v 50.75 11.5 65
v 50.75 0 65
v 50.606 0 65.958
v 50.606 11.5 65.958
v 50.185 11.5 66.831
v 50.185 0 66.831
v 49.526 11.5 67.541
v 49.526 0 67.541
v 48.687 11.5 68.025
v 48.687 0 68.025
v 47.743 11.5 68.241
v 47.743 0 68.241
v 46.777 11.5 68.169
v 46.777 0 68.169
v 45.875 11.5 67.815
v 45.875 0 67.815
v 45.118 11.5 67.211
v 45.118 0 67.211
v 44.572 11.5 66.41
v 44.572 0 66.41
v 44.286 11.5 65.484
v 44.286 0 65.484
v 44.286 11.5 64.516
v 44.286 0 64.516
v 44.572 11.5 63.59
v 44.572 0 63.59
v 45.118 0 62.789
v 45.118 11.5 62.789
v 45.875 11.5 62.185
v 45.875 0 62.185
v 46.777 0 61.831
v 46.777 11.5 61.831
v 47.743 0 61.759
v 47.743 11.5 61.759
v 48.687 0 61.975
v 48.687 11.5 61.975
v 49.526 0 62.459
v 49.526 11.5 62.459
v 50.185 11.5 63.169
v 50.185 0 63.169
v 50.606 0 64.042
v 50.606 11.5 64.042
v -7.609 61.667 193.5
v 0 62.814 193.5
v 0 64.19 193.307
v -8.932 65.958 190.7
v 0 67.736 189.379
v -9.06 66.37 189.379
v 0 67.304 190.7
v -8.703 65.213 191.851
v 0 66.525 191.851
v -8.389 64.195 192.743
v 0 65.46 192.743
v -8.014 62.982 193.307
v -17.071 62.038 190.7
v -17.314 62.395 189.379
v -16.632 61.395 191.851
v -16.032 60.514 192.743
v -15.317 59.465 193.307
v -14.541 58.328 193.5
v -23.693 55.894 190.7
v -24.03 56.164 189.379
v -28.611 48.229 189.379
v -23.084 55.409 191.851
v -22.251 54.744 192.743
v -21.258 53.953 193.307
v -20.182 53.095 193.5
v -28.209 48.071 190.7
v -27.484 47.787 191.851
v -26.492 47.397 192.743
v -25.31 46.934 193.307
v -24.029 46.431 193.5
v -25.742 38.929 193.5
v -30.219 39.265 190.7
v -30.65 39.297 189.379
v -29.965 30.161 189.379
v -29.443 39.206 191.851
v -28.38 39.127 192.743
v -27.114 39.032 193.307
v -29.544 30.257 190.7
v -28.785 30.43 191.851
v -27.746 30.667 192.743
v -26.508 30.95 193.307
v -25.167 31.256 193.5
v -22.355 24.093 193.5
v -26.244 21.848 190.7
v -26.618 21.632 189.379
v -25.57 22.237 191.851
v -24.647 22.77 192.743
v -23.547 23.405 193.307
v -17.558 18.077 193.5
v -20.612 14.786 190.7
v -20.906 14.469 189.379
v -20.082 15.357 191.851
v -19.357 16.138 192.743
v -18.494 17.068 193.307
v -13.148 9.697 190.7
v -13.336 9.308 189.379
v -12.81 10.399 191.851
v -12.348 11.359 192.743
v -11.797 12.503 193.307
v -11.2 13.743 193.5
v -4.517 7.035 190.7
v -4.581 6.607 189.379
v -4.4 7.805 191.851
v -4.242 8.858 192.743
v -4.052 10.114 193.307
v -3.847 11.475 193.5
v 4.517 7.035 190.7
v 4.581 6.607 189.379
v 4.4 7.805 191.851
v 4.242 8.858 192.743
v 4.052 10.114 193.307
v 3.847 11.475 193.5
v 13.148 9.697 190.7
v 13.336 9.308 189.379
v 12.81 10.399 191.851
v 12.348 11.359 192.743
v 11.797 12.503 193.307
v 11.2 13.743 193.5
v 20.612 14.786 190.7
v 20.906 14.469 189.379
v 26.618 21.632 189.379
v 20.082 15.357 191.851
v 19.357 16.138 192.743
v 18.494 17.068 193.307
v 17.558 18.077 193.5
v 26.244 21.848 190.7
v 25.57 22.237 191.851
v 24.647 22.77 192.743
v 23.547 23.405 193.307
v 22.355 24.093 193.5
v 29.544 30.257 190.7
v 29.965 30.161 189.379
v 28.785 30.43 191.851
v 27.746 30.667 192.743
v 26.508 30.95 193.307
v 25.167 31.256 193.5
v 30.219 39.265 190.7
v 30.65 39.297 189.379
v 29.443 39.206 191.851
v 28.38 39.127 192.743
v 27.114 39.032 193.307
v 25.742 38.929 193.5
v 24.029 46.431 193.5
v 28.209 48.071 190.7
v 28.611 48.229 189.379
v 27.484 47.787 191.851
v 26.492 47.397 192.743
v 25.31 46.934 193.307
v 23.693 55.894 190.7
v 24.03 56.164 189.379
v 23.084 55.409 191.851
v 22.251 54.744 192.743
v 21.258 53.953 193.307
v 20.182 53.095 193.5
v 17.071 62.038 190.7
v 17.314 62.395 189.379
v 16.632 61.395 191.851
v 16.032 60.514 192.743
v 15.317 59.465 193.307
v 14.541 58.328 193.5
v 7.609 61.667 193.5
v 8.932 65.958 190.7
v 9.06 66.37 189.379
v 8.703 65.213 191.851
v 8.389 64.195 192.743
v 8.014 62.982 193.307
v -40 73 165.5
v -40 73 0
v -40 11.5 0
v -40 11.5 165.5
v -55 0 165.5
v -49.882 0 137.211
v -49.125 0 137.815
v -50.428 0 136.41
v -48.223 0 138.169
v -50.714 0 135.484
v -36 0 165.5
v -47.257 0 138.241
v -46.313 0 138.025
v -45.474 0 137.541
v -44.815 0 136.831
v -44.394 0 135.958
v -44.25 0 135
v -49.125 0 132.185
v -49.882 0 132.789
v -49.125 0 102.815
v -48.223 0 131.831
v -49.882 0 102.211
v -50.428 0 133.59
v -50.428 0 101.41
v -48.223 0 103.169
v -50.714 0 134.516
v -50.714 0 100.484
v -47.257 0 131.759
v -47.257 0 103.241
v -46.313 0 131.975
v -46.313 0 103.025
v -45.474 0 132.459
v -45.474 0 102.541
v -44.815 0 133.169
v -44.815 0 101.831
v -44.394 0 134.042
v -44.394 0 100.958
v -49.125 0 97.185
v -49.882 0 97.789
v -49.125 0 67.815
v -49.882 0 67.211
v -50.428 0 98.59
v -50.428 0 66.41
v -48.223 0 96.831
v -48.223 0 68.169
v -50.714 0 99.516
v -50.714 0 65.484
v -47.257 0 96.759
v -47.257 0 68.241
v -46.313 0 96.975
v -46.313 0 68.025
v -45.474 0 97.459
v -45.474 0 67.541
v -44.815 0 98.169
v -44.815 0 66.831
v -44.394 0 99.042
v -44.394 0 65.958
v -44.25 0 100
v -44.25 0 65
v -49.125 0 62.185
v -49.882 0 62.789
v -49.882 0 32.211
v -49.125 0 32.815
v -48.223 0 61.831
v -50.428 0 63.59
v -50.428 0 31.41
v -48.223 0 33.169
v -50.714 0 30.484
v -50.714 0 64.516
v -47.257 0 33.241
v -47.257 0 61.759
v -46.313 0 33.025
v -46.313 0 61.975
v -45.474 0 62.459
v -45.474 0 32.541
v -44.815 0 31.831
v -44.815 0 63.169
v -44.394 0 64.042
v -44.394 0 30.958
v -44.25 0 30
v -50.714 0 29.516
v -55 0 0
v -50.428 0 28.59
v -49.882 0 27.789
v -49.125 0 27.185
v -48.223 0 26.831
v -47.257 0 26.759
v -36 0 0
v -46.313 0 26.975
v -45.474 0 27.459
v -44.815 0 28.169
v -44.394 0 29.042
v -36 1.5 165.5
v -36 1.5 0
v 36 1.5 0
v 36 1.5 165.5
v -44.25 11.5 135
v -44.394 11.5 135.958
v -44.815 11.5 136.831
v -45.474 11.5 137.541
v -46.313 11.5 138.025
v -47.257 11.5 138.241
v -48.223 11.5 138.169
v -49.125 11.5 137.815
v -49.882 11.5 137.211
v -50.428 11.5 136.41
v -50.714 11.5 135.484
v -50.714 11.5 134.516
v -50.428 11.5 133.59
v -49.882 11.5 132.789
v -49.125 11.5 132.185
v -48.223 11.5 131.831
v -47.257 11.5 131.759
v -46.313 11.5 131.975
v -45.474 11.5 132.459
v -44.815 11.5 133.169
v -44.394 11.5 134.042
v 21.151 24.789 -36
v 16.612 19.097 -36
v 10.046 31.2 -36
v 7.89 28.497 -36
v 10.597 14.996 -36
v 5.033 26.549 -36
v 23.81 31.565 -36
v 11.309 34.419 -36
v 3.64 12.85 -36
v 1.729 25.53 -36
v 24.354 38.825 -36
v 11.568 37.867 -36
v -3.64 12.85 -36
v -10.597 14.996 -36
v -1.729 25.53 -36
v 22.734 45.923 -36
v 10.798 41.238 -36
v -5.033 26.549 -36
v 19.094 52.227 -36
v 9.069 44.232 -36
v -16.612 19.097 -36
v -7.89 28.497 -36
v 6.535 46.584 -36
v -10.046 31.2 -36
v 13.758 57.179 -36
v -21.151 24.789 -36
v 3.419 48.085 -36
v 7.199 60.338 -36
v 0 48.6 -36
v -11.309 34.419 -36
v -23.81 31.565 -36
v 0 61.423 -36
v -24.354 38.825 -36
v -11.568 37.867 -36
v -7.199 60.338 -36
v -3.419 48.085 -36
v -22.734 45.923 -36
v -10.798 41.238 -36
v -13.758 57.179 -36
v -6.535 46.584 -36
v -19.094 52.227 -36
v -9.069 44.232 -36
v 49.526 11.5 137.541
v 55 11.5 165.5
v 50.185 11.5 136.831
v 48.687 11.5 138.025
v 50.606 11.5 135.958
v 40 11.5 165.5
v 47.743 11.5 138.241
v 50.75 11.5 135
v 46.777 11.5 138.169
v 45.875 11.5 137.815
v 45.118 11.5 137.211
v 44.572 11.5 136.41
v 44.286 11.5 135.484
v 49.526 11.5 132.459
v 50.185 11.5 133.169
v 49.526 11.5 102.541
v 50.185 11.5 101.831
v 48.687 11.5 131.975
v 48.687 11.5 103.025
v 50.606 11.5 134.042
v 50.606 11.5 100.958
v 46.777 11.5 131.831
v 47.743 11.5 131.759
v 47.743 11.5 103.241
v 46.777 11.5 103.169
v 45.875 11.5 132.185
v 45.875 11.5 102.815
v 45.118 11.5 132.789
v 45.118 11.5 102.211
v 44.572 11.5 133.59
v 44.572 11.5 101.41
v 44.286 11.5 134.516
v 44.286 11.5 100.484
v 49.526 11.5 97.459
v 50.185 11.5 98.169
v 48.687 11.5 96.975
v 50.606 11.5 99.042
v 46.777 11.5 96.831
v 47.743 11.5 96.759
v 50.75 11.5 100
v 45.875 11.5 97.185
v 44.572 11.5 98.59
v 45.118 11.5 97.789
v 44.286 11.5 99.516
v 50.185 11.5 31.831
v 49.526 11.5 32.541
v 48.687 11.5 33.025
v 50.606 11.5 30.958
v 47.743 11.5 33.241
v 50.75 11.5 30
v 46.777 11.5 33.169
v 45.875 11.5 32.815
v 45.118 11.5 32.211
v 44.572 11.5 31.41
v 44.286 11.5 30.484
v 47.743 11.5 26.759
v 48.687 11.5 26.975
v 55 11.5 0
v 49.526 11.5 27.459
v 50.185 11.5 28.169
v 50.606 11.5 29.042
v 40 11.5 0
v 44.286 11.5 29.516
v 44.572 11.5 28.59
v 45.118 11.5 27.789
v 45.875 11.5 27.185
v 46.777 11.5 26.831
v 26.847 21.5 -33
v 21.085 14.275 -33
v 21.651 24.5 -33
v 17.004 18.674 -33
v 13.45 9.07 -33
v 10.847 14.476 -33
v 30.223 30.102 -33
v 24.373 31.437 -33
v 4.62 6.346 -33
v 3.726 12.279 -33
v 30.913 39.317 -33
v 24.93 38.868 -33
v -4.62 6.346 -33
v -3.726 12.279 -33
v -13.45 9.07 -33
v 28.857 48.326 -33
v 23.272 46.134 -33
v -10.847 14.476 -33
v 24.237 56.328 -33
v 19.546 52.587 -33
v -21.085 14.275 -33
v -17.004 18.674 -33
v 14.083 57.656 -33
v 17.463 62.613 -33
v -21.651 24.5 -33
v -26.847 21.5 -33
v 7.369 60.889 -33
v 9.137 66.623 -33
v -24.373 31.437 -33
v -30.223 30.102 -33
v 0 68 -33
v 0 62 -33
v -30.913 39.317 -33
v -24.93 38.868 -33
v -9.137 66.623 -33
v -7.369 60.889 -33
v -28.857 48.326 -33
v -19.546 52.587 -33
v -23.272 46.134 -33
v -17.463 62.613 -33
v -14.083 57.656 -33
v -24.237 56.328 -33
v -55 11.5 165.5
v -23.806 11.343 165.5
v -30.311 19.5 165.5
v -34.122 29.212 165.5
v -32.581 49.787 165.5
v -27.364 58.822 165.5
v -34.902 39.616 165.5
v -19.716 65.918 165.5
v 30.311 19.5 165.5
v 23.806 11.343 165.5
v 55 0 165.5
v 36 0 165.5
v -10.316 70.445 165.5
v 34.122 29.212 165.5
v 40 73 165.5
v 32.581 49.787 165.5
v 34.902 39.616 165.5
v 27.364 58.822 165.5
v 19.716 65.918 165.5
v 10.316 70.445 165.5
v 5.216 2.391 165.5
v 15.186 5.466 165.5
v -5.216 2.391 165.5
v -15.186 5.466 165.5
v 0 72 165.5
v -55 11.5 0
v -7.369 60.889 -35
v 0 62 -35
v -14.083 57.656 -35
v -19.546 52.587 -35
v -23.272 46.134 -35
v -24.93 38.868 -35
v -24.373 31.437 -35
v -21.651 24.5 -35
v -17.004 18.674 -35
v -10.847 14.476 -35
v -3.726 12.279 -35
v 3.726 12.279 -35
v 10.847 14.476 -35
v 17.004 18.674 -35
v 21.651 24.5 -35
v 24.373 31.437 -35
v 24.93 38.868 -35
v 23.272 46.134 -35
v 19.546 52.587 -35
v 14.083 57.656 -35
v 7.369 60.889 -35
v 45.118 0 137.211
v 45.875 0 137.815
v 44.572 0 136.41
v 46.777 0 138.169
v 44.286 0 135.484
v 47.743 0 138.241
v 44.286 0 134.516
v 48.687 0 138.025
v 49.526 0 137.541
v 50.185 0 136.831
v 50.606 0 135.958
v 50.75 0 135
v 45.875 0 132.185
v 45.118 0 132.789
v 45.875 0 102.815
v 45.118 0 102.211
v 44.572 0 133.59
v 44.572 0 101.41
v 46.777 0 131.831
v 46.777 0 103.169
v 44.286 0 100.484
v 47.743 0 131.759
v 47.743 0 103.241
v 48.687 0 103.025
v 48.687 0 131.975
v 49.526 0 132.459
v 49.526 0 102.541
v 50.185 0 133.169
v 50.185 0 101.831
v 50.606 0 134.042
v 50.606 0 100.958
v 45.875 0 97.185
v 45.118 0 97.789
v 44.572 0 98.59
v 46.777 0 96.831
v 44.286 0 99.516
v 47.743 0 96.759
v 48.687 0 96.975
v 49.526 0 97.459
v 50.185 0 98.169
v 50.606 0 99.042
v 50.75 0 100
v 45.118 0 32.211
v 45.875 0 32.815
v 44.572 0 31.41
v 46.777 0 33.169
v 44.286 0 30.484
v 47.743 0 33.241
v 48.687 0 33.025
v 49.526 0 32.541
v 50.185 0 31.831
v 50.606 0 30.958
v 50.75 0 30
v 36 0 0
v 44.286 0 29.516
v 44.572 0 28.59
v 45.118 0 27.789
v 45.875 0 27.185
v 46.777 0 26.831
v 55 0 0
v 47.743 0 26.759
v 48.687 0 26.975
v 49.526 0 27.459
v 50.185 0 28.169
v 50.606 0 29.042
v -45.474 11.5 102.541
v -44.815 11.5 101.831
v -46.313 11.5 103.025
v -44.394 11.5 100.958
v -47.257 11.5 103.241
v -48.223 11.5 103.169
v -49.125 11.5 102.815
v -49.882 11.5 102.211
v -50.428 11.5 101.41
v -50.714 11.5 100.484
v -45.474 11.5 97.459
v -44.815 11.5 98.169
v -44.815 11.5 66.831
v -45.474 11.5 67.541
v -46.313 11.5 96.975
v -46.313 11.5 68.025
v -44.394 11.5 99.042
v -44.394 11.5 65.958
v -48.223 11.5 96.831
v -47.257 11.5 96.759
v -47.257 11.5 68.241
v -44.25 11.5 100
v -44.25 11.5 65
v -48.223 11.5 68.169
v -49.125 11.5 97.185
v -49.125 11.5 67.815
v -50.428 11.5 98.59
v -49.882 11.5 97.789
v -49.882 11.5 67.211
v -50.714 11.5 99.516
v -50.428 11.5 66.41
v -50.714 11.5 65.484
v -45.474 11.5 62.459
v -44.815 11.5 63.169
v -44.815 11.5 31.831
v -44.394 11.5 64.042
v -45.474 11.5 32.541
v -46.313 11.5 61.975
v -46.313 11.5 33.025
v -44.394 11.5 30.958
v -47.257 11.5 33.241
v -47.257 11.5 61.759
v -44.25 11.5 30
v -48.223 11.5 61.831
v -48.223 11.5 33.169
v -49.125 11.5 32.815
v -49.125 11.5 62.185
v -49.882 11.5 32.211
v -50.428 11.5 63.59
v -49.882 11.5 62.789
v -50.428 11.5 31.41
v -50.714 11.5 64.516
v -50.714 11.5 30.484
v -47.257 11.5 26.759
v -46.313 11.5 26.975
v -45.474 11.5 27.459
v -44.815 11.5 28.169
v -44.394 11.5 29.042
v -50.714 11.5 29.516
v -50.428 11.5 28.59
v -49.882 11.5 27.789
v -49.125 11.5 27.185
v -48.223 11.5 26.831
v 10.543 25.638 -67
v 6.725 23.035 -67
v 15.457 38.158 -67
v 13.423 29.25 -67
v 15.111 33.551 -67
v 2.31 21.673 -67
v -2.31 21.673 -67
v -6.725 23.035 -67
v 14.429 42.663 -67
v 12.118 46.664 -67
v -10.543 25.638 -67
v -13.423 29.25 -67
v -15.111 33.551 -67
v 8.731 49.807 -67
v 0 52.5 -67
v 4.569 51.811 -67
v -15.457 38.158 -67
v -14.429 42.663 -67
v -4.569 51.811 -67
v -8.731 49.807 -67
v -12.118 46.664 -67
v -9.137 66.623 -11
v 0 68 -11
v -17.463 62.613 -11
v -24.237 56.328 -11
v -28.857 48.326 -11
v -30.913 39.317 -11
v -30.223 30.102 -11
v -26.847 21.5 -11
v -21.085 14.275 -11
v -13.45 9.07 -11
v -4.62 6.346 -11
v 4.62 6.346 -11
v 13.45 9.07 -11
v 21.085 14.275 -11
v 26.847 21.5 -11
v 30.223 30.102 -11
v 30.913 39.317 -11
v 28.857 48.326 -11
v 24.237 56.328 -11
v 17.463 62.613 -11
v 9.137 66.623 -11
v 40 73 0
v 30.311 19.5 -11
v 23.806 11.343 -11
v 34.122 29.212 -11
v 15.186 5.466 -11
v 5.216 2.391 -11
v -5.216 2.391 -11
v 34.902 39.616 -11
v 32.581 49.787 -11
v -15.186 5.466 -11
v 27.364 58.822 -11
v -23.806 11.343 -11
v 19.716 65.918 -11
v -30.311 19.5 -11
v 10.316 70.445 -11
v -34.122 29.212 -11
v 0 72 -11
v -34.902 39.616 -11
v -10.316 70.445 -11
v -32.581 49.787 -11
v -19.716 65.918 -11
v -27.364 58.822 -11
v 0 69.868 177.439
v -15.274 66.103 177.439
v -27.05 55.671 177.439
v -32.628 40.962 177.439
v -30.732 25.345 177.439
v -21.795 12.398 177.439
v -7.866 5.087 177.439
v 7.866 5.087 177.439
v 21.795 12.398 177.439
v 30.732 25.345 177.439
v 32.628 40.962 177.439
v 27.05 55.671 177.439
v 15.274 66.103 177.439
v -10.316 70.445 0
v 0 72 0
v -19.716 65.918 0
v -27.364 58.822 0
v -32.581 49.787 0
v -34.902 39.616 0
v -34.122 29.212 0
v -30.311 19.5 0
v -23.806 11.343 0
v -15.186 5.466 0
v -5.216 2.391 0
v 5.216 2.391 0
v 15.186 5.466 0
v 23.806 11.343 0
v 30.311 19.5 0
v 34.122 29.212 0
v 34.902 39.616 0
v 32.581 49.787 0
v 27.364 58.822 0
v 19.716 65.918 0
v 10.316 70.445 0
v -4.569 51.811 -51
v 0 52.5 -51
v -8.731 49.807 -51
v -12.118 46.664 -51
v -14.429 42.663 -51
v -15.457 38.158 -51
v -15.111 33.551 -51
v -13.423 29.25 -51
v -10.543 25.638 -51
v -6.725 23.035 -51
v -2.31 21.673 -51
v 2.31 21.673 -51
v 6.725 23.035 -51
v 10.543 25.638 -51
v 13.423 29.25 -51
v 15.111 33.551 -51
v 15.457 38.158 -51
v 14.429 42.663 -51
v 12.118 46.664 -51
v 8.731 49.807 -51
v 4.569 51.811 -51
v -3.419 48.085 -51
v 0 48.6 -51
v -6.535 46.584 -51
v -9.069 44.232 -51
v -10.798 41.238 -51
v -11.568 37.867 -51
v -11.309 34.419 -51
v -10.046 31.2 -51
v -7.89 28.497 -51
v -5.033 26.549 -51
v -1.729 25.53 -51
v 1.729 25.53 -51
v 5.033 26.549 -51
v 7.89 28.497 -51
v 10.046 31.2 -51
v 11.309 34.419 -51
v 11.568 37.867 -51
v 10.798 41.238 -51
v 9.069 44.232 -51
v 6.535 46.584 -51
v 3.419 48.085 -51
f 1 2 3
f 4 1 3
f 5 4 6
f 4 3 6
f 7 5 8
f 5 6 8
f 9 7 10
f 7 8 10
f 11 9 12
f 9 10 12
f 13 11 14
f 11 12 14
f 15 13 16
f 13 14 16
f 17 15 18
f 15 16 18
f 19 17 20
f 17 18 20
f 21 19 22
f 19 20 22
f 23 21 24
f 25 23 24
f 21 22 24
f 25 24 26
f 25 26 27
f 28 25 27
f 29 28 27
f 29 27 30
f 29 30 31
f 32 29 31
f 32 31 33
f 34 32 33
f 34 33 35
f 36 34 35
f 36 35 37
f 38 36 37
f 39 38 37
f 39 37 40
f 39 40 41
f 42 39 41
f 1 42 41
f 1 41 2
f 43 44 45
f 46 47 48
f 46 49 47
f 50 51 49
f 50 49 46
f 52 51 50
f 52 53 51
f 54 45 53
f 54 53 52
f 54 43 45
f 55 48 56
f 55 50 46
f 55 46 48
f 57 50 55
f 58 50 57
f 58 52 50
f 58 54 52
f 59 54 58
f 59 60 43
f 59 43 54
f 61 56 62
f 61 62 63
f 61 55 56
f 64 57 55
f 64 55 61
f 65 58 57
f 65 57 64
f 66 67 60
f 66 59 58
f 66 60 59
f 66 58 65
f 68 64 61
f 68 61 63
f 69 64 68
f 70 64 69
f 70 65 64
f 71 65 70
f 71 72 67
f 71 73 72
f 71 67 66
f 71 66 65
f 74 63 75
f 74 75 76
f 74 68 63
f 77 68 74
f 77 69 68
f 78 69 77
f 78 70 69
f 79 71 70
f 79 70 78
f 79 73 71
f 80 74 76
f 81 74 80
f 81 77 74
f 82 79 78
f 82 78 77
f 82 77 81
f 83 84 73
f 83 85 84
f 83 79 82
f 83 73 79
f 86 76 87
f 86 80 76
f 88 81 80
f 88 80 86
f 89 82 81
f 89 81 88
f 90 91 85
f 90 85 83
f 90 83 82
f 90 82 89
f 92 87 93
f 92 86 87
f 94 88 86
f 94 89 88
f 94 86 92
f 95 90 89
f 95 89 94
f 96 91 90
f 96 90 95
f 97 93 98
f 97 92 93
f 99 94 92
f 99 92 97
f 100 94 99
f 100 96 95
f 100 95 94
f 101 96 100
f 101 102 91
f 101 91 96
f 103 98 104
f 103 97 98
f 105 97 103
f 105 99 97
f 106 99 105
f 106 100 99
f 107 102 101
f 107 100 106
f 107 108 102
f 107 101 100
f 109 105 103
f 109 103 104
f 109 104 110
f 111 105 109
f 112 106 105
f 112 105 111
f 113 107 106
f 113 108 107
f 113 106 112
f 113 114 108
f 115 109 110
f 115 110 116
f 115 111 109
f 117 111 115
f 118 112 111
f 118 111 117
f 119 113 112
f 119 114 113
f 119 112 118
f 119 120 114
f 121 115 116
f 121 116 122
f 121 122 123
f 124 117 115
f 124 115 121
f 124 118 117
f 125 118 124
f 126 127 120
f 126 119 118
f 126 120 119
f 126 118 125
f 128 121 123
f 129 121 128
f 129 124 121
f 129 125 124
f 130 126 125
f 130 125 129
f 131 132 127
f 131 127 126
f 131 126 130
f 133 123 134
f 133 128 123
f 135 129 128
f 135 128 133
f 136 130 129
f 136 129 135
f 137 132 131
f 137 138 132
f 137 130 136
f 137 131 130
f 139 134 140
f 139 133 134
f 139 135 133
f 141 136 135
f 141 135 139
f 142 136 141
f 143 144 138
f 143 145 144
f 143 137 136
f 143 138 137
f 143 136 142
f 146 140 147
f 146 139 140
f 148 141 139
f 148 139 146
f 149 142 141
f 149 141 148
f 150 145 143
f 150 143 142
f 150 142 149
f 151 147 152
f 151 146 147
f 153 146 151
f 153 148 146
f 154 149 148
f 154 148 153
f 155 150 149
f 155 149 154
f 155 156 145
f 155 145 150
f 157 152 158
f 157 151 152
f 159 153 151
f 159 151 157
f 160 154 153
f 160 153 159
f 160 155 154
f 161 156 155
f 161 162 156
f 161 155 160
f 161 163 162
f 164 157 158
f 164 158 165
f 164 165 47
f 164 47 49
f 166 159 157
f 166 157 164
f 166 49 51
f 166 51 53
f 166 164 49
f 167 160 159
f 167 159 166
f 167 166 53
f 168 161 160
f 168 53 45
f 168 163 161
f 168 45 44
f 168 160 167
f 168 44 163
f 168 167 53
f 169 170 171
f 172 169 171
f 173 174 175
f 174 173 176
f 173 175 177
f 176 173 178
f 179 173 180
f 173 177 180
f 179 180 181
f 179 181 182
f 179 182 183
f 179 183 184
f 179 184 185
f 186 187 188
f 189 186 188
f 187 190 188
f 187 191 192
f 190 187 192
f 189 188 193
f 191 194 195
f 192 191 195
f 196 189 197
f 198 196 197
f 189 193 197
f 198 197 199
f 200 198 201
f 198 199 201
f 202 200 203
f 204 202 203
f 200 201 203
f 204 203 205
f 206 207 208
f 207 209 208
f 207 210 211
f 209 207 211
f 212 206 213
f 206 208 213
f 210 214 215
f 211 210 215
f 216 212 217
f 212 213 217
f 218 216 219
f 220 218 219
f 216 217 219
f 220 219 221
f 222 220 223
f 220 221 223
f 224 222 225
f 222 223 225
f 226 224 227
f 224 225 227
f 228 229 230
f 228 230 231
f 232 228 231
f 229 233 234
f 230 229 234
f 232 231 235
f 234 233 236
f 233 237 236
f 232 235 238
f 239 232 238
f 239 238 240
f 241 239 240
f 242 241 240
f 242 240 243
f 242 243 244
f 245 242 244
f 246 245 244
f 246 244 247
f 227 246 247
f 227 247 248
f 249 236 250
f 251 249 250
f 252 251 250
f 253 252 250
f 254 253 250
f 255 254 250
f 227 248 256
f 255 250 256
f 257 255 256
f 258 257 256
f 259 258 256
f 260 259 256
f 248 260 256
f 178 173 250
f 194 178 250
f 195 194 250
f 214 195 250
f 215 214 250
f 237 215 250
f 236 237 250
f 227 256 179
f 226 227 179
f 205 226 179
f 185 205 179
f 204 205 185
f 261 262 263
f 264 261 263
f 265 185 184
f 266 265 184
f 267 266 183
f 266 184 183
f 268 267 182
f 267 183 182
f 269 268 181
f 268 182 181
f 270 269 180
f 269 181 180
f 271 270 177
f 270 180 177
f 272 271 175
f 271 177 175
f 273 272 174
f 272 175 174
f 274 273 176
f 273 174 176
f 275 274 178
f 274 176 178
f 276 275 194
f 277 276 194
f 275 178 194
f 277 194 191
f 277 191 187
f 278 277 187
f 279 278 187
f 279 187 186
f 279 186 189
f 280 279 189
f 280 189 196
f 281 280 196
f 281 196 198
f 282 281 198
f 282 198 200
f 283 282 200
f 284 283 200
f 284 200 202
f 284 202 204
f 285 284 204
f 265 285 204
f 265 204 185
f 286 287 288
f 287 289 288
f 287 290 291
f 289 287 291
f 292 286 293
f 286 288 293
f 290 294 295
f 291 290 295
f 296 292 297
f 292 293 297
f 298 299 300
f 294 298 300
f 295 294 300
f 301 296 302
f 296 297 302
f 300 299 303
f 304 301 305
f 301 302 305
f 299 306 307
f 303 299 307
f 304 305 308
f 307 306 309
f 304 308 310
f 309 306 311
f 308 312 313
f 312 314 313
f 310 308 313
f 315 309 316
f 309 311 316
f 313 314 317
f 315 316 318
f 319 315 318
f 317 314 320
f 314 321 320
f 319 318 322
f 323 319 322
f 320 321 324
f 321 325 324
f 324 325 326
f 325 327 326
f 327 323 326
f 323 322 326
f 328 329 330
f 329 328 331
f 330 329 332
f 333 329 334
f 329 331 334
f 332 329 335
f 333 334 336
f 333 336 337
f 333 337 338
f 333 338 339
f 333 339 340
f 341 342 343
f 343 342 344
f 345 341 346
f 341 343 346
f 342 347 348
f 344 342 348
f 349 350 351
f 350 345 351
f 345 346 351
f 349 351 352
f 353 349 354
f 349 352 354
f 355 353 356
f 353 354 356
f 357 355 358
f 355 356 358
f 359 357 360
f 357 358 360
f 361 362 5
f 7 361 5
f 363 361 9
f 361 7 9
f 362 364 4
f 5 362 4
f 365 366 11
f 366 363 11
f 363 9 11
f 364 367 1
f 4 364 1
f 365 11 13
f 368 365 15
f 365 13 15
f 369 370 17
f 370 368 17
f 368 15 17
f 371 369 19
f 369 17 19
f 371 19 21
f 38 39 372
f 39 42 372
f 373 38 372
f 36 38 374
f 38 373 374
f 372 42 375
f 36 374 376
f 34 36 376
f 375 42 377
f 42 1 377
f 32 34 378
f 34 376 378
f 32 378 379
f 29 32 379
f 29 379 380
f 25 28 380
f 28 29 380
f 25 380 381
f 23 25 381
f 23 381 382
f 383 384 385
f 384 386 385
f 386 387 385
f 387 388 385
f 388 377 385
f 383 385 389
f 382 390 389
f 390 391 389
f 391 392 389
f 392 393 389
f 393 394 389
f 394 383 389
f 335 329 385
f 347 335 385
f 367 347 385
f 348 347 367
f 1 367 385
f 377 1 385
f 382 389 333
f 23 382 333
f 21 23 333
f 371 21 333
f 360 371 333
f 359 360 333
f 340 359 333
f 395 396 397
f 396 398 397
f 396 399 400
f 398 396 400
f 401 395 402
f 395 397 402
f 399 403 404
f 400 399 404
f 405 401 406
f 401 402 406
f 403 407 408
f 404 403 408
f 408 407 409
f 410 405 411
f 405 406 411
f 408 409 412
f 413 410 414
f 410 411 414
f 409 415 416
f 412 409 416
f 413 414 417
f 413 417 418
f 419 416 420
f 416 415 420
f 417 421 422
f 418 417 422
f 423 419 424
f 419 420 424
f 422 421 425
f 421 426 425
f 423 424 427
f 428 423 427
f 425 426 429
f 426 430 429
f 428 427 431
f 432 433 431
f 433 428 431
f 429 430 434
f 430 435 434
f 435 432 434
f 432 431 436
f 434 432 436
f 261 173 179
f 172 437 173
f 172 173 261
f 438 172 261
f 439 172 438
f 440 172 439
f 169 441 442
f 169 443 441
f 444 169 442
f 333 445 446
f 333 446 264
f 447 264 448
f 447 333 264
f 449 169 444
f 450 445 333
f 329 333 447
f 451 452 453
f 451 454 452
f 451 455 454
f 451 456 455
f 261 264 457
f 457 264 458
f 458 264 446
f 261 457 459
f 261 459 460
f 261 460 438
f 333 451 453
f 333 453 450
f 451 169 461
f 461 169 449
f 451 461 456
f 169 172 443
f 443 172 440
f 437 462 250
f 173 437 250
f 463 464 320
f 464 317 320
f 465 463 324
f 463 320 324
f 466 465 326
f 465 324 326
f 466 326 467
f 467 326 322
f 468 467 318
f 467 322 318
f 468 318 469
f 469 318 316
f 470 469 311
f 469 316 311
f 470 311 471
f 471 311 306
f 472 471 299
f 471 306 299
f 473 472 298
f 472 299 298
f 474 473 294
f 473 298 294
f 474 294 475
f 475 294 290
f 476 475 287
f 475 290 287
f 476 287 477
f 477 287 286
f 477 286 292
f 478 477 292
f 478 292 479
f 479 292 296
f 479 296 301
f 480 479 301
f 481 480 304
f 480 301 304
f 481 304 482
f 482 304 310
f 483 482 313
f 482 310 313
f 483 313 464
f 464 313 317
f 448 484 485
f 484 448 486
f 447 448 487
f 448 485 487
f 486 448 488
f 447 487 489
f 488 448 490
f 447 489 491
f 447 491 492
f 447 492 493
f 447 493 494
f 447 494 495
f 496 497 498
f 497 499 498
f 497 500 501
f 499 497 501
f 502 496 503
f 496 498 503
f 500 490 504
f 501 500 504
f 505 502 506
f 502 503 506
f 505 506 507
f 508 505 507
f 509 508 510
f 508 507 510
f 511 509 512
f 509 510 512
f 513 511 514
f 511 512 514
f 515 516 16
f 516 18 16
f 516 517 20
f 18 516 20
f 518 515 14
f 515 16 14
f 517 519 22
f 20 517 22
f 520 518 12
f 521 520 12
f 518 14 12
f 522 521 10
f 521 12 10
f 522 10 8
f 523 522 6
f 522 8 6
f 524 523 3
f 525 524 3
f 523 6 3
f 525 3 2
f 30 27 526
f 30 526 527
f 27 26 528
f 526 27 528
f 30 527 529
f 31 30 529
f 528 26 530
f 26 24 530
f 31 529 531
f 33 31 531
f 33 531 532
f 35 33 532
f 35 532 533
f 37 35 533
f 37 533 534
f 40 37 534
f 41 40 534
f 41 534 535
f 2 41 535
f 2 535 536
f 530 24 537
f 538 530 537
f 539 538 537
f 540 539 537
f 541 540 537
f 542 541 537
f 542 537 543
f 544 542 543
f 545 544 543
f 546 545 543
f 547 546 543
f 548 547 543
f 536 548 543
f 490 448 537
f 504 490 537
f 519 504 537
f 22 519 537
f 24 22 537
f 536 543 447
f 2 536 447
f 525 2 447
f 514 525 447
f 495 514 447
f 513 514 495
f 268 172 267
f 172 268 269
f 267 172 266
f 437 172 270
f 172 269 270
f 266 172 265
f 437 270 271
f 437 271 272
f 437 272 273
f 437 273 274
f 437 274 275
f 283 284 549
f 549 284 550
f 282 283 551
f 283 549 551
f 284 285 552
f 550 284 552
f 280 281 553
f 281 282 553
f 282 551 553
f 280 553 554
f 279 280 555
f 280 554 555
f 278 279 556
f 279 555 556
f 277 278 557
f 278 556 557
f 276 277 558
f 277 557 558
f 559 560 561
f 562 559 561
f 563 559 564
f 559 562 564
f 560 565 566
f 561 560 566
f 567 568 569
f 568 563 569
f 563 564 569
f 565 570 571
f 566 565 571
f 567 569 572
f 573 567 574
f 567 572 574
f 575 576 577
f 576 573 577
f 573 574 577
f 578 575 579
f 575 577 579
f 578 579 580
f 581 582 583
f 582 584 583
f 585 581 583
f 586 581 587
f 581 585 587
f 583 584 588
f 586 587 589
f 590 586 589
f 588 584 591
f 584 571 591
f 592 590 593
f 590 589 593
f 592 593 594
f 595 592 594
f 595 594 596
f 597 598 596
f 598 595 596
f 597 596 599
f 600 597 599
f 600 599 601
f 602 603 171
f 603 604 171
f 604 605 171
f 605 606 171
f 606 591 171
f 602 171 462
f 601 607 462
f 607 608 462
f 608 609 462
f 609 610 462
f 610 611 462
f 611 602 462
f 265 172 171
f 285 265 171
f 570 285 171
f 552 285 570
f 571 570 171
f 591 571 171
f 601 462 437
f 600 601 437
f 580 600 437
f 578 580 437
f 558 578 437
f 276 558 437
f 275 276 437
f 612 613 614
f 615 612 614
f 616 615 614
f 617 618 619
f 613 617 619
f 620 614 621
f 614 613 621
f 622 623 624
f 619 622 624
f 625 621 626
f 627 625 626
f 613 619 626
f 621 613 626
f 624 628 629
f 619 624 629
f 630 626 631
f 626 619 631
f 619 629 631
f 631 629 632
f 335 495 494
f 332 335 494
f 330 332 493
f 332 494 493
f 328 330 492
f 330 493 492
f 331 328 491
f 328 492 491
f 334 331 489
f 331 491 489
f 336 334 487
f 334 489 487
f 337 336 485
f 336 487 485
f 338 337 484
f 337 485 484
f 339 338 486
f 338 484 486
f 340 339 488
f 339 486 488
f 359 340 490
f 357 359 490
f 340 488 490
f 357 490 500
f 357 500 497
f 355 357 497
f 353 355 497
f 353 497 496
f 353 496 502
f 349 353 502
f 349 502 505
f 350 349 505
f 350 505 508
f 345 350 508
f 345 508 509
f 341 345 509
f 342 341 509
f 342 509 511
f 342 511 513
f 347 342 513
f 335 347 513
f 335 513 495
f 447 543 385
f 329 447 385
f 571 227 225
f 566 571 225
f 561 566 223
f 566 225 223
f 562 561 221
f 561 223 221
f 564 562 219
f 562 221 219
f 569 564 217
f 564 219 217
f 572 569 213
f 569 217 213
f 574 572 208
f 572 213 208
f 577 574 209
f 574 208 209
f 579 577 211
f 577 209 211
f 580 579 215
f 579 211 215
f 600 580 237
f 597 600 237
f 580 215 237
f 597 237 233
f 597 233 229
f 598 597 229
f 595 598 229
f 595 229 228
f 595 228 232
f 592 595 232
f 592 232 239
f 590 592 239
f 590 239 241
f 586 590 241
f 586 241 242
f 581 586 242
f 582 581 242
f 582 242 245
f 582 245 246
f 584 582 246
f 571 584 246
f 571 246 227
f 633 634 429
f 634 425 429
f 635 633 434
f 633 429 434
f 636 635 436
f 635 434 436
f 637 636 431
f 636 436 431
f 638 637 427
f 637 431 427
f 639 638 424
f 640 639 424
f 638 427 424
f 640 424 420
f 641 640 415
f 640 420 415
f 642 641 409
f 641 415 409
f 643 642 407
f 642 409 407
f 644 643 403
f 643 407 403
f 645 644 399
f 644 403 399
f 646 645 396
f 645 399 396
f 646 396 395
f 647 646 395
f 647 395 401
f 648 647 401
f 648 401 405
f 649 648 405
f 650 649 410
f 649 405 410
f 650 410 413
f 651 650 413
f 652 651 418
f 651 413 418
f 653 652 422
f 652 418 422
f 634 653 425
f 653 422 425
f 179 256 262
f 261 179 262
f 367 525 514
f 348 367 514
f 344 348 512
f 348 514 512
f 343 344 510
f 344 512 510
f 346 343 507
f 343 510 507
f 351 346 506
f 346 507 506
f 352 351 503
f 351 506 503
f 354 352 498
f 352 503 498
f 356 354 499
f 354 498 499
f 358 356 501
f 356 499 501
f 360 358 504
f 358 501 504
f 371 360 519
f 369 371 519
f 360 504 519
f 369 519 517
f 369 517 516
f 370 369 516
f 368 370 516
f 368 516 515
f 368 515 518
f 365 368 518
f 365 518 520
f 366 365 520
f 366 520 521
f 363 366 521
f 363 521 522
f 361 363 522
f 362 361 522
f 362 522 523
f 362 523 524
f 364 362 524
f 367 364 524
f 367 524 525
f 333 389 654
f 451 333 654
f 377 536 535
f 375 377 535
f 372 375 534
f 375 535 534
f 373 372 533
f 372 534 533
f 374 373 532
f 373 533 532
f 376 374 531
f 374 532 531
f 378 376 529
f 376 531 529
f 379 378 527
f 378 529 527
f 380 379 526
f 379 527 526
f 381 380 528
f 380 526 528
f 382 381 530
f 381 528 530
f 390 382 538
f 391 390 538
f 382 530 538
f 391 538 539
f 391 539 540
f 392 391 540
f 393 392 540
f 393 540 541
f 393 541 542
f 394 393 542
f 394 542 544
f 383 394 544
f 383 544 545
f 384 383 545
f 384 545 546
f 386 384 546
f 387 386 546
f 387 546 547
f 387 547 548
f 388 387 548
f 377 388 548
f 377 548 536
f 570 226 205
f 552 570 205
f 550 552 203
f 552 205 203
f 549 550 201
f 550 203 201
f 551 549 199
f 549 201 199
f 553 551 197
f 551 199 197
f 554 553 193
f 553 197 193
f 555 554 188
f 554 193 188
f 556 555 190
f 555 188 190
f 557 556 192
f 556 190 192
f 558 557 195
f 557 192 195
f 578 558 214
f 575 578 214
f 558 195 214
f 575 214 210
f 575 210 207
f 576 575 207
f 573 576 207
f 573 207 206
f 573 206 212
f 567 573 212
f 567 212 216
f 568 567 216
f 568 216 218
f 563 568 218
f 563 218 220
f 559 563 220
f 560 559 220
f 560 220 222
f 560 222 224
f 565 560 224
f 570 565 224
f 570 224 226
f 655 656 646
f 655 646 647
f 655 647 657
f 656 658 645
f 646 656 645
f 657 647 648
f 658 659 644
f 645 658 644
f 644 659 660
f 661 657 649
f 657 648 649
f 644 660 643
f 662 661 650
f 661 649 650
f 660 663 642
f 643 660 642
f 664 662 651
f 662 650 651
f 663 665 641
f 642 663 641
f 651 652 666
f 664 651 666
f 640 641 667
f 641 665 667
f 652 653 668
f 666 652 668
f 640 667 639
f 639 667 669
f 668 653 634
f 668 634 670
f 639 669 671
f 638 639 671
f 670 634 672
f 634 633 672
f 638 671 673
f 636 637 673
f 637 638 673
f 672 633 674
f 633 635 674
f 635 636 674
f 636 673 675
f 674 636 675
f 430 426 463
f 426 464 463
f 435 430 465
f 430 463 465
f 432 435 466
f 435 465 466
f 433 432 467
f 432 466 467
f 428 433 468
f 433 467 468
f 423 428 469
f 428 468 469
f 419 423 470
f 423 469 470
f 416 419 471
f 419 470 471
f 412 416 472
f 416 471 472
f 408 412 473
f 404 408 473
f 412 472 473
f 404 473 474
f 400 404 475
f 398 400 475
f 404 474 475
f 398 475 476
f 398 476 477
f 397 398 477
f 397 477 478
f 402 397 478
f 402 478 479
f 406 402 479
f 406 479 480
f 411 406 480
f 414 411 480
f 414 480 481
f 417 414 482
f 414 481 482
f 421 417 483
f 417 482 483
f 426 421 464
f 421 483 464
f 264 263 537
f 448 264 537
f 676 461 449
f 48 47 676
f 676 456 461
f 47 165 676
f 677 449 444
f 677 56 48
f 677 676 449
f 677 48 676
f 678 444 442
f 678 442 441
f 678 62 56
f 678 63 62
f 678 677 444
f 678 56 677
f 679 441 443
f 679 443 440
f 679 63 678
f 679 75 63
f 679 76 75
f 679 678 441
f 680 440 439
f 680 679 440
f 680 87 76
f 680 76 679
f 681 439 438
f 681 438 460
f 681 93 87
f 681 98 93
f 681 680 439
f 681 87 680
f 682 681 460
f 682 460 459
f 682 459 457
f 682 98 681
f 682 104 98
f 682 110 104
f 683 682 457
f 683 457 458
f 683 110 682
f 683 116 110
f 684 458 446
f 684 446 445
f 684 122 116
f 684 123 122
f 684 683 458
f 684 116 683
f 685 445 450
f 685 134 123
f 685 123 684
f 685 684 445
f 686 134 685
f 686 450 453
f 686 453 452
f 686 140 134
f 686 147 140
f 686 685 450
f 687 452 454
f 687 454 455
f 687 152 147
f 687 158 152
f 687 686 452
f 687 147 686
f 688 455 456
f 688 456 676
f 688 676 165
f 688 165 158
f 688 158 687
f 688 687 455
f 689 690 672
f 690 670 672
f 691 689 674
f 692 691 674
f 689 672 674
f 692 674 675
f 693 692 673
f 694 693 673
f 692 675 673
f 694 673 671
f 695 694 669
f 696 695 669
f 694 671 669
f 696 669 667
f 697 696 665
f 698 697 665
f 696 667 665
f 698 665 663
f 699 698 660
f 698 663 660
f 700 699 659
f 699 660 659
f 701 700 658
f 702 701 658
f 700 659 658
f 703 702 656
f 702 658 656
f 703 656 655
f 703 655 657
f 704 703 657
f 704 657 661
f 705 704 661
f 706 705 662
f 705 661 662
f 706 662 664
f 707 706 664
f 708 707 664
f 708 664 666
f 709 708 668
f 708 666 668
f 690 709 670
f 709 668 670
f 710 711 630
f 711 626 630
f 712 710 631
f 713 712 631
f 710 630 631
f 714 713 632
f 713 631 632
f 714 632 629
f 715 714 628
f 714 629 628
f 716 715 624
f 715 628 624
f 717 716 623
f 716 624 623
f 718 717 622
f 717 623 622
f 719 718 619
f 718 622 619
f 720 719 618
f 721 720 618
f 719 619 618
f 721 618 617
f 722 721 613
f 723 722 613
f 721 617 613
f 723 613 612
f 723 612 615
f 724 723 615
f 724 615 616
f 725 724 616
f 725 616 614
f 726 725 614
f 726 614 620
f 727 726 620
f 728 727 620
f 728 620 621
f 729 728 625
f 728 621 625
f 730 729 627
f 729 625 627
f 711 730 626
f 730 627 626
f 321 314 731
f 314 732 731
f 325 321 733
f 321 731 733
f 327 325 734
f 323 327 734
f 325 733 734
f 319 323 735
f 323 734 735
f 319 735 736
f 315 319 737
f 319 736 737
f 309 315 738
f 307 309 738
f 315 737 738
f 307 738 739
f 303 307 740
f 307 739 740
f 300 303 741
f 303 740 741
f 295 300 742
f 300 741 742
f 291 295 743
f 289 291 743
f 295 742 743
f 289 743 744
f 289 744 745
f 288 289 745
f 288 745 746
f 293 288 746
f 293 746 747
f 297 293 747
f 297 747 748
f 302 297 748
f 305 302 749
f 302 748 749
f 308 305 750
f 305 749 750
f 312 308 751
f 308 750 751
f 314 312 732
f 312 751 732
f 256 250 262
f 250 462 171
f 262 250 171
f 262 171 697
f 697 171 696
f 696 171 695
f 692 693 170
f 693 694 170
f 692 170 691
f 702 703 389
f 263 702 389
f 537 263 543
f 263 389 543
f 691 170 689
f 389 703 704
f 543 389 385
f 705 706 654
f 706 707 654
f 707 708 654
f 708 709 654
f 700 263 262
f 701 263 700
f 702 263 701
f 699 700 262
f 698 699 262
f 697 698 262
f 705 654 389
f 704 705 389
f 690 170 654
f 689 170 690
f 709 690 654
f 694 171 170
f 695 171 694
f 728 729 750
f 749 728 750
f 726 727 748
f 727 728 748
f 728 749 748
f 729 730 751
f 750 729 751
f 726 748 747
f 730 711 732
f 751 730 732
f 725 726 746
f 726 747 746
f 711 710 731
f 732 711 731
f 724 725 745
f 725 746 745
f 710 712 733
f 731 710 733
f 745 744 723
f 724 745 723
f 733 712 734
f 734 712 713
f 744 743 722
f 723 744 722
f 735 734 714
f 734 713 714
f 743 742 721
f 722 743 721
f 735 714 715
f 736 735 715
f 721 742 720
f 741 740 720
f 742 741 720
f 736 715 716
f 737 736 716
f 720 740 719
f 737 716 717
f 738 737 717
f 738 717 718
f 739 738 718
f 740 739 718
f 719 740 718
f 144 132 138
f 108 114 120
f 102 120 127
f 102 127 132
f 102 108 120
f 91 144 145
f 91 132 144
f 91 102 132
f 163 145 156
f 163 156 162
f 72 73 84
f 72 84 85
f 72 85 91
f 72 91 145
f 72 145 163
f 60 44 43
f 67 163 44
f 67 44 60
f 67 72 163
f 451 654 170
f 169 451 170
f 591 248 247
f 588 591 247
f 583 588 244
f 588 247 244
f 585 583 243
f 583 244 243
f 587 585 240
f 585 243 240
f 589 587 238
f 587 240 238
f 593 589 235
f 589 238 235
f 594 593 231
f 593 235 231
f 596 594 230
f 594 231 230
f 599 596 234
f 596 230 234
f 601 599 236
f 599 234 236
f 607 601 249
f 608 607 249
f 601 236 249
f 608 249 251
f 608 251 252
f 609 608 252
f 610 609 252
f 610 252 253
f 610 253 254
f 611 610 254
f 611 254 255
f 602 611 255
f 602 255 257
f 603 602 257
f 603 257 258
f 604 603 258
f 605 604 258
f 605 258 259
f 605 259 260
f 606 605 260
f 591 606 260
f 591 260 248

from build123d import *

# Parameters (mm, degrees)
AUFSATZ_LINEAR_AUSTRAGEN1_DEPTH = 165.5
SKIZZE3_R                       = 3.25
SCHNITT_LINEAR_AUSTRAGEN1_DEPTH = 20


with BuildPart() as part:
    # Skizze1 → Aufsatz-Linear austragen1 (new body)
    with BuildSketch(Plane.XY):
        Polygon((-36, 1.5), (36, 1.5), (36, 0), (55, 0), (55, 11.5), (40, 11.5), (40, 73), (-40, 73), (-40, 11.5), (-55, 11.5), (-55, 0), (-36, 0), align=None)
    extrude(amount=AUFSATZ_LINEAR_AUSTRAGEN1_DEPTH)

    # Skizze2 → Rotation1 (revolve)
    with BuildSketch(Plane(origin=(0, 0, 0), x_dir=(0, 0, -1), z_dir=(1, 0, 0))):
        with BuildLine():
            Line((-165.5, 72), (-189.378953192, 67.735901216))
            ThreePointArc((-189.378953192, 67.735901216), (-192.333716602, 66.023532336), (-193.5, 62.813763338))
            Line((-193.5, 62.813763338), (-193.5, 37))
            Line((-193.5, 37), (-165.5, 37))
            Line((-165.5, 37), (-165.5, 72))
        make_face()
        Polygon((0, 72), (11, 72), (11, 68), (33, 68), (33, 62), (35, 62), (36, 61.422649731), (36, 48.6), (51, 48.6), (51, 52.5), (67, 52.5), (67, 37), (0, 37), align=None)
    revolve(axis=Axis((0, 37, -51.73091969), (0, 0, 1)))

    # Skizze3 → Schnitt-Linear austragen1 (cut)
    with BuildSketch(Plane.XZ):
        with Locations((47.5, 30)):
            Circle(SKIZZE3_R)
        with Locations((47.5, 65)):
            Circle(SKIZZE3_R)
        with Locations((47.5, 100)):
            Circle(SKIZZE3_R)
        with Locations((47.5, 135)):
            Circle(SKIZZE3_R)
        with Locations((-47.5, 30)):
            Circle(SKIZZE3_R)
        with Locations((-47.5, 65)):
            Circle(SKIZZE3_R)
        with Locations((-47.5, 100)):
            Circle(SKIZZE3_R)
        with Locations((-47.5, 135)):
            Circle(SKIZZE3_R)
    extrude(amount=-SCHNITT_LINEAR_AUSTRAGEN1_DEPTH, mode=Mode.SUBTRACT)


solid = part.part
